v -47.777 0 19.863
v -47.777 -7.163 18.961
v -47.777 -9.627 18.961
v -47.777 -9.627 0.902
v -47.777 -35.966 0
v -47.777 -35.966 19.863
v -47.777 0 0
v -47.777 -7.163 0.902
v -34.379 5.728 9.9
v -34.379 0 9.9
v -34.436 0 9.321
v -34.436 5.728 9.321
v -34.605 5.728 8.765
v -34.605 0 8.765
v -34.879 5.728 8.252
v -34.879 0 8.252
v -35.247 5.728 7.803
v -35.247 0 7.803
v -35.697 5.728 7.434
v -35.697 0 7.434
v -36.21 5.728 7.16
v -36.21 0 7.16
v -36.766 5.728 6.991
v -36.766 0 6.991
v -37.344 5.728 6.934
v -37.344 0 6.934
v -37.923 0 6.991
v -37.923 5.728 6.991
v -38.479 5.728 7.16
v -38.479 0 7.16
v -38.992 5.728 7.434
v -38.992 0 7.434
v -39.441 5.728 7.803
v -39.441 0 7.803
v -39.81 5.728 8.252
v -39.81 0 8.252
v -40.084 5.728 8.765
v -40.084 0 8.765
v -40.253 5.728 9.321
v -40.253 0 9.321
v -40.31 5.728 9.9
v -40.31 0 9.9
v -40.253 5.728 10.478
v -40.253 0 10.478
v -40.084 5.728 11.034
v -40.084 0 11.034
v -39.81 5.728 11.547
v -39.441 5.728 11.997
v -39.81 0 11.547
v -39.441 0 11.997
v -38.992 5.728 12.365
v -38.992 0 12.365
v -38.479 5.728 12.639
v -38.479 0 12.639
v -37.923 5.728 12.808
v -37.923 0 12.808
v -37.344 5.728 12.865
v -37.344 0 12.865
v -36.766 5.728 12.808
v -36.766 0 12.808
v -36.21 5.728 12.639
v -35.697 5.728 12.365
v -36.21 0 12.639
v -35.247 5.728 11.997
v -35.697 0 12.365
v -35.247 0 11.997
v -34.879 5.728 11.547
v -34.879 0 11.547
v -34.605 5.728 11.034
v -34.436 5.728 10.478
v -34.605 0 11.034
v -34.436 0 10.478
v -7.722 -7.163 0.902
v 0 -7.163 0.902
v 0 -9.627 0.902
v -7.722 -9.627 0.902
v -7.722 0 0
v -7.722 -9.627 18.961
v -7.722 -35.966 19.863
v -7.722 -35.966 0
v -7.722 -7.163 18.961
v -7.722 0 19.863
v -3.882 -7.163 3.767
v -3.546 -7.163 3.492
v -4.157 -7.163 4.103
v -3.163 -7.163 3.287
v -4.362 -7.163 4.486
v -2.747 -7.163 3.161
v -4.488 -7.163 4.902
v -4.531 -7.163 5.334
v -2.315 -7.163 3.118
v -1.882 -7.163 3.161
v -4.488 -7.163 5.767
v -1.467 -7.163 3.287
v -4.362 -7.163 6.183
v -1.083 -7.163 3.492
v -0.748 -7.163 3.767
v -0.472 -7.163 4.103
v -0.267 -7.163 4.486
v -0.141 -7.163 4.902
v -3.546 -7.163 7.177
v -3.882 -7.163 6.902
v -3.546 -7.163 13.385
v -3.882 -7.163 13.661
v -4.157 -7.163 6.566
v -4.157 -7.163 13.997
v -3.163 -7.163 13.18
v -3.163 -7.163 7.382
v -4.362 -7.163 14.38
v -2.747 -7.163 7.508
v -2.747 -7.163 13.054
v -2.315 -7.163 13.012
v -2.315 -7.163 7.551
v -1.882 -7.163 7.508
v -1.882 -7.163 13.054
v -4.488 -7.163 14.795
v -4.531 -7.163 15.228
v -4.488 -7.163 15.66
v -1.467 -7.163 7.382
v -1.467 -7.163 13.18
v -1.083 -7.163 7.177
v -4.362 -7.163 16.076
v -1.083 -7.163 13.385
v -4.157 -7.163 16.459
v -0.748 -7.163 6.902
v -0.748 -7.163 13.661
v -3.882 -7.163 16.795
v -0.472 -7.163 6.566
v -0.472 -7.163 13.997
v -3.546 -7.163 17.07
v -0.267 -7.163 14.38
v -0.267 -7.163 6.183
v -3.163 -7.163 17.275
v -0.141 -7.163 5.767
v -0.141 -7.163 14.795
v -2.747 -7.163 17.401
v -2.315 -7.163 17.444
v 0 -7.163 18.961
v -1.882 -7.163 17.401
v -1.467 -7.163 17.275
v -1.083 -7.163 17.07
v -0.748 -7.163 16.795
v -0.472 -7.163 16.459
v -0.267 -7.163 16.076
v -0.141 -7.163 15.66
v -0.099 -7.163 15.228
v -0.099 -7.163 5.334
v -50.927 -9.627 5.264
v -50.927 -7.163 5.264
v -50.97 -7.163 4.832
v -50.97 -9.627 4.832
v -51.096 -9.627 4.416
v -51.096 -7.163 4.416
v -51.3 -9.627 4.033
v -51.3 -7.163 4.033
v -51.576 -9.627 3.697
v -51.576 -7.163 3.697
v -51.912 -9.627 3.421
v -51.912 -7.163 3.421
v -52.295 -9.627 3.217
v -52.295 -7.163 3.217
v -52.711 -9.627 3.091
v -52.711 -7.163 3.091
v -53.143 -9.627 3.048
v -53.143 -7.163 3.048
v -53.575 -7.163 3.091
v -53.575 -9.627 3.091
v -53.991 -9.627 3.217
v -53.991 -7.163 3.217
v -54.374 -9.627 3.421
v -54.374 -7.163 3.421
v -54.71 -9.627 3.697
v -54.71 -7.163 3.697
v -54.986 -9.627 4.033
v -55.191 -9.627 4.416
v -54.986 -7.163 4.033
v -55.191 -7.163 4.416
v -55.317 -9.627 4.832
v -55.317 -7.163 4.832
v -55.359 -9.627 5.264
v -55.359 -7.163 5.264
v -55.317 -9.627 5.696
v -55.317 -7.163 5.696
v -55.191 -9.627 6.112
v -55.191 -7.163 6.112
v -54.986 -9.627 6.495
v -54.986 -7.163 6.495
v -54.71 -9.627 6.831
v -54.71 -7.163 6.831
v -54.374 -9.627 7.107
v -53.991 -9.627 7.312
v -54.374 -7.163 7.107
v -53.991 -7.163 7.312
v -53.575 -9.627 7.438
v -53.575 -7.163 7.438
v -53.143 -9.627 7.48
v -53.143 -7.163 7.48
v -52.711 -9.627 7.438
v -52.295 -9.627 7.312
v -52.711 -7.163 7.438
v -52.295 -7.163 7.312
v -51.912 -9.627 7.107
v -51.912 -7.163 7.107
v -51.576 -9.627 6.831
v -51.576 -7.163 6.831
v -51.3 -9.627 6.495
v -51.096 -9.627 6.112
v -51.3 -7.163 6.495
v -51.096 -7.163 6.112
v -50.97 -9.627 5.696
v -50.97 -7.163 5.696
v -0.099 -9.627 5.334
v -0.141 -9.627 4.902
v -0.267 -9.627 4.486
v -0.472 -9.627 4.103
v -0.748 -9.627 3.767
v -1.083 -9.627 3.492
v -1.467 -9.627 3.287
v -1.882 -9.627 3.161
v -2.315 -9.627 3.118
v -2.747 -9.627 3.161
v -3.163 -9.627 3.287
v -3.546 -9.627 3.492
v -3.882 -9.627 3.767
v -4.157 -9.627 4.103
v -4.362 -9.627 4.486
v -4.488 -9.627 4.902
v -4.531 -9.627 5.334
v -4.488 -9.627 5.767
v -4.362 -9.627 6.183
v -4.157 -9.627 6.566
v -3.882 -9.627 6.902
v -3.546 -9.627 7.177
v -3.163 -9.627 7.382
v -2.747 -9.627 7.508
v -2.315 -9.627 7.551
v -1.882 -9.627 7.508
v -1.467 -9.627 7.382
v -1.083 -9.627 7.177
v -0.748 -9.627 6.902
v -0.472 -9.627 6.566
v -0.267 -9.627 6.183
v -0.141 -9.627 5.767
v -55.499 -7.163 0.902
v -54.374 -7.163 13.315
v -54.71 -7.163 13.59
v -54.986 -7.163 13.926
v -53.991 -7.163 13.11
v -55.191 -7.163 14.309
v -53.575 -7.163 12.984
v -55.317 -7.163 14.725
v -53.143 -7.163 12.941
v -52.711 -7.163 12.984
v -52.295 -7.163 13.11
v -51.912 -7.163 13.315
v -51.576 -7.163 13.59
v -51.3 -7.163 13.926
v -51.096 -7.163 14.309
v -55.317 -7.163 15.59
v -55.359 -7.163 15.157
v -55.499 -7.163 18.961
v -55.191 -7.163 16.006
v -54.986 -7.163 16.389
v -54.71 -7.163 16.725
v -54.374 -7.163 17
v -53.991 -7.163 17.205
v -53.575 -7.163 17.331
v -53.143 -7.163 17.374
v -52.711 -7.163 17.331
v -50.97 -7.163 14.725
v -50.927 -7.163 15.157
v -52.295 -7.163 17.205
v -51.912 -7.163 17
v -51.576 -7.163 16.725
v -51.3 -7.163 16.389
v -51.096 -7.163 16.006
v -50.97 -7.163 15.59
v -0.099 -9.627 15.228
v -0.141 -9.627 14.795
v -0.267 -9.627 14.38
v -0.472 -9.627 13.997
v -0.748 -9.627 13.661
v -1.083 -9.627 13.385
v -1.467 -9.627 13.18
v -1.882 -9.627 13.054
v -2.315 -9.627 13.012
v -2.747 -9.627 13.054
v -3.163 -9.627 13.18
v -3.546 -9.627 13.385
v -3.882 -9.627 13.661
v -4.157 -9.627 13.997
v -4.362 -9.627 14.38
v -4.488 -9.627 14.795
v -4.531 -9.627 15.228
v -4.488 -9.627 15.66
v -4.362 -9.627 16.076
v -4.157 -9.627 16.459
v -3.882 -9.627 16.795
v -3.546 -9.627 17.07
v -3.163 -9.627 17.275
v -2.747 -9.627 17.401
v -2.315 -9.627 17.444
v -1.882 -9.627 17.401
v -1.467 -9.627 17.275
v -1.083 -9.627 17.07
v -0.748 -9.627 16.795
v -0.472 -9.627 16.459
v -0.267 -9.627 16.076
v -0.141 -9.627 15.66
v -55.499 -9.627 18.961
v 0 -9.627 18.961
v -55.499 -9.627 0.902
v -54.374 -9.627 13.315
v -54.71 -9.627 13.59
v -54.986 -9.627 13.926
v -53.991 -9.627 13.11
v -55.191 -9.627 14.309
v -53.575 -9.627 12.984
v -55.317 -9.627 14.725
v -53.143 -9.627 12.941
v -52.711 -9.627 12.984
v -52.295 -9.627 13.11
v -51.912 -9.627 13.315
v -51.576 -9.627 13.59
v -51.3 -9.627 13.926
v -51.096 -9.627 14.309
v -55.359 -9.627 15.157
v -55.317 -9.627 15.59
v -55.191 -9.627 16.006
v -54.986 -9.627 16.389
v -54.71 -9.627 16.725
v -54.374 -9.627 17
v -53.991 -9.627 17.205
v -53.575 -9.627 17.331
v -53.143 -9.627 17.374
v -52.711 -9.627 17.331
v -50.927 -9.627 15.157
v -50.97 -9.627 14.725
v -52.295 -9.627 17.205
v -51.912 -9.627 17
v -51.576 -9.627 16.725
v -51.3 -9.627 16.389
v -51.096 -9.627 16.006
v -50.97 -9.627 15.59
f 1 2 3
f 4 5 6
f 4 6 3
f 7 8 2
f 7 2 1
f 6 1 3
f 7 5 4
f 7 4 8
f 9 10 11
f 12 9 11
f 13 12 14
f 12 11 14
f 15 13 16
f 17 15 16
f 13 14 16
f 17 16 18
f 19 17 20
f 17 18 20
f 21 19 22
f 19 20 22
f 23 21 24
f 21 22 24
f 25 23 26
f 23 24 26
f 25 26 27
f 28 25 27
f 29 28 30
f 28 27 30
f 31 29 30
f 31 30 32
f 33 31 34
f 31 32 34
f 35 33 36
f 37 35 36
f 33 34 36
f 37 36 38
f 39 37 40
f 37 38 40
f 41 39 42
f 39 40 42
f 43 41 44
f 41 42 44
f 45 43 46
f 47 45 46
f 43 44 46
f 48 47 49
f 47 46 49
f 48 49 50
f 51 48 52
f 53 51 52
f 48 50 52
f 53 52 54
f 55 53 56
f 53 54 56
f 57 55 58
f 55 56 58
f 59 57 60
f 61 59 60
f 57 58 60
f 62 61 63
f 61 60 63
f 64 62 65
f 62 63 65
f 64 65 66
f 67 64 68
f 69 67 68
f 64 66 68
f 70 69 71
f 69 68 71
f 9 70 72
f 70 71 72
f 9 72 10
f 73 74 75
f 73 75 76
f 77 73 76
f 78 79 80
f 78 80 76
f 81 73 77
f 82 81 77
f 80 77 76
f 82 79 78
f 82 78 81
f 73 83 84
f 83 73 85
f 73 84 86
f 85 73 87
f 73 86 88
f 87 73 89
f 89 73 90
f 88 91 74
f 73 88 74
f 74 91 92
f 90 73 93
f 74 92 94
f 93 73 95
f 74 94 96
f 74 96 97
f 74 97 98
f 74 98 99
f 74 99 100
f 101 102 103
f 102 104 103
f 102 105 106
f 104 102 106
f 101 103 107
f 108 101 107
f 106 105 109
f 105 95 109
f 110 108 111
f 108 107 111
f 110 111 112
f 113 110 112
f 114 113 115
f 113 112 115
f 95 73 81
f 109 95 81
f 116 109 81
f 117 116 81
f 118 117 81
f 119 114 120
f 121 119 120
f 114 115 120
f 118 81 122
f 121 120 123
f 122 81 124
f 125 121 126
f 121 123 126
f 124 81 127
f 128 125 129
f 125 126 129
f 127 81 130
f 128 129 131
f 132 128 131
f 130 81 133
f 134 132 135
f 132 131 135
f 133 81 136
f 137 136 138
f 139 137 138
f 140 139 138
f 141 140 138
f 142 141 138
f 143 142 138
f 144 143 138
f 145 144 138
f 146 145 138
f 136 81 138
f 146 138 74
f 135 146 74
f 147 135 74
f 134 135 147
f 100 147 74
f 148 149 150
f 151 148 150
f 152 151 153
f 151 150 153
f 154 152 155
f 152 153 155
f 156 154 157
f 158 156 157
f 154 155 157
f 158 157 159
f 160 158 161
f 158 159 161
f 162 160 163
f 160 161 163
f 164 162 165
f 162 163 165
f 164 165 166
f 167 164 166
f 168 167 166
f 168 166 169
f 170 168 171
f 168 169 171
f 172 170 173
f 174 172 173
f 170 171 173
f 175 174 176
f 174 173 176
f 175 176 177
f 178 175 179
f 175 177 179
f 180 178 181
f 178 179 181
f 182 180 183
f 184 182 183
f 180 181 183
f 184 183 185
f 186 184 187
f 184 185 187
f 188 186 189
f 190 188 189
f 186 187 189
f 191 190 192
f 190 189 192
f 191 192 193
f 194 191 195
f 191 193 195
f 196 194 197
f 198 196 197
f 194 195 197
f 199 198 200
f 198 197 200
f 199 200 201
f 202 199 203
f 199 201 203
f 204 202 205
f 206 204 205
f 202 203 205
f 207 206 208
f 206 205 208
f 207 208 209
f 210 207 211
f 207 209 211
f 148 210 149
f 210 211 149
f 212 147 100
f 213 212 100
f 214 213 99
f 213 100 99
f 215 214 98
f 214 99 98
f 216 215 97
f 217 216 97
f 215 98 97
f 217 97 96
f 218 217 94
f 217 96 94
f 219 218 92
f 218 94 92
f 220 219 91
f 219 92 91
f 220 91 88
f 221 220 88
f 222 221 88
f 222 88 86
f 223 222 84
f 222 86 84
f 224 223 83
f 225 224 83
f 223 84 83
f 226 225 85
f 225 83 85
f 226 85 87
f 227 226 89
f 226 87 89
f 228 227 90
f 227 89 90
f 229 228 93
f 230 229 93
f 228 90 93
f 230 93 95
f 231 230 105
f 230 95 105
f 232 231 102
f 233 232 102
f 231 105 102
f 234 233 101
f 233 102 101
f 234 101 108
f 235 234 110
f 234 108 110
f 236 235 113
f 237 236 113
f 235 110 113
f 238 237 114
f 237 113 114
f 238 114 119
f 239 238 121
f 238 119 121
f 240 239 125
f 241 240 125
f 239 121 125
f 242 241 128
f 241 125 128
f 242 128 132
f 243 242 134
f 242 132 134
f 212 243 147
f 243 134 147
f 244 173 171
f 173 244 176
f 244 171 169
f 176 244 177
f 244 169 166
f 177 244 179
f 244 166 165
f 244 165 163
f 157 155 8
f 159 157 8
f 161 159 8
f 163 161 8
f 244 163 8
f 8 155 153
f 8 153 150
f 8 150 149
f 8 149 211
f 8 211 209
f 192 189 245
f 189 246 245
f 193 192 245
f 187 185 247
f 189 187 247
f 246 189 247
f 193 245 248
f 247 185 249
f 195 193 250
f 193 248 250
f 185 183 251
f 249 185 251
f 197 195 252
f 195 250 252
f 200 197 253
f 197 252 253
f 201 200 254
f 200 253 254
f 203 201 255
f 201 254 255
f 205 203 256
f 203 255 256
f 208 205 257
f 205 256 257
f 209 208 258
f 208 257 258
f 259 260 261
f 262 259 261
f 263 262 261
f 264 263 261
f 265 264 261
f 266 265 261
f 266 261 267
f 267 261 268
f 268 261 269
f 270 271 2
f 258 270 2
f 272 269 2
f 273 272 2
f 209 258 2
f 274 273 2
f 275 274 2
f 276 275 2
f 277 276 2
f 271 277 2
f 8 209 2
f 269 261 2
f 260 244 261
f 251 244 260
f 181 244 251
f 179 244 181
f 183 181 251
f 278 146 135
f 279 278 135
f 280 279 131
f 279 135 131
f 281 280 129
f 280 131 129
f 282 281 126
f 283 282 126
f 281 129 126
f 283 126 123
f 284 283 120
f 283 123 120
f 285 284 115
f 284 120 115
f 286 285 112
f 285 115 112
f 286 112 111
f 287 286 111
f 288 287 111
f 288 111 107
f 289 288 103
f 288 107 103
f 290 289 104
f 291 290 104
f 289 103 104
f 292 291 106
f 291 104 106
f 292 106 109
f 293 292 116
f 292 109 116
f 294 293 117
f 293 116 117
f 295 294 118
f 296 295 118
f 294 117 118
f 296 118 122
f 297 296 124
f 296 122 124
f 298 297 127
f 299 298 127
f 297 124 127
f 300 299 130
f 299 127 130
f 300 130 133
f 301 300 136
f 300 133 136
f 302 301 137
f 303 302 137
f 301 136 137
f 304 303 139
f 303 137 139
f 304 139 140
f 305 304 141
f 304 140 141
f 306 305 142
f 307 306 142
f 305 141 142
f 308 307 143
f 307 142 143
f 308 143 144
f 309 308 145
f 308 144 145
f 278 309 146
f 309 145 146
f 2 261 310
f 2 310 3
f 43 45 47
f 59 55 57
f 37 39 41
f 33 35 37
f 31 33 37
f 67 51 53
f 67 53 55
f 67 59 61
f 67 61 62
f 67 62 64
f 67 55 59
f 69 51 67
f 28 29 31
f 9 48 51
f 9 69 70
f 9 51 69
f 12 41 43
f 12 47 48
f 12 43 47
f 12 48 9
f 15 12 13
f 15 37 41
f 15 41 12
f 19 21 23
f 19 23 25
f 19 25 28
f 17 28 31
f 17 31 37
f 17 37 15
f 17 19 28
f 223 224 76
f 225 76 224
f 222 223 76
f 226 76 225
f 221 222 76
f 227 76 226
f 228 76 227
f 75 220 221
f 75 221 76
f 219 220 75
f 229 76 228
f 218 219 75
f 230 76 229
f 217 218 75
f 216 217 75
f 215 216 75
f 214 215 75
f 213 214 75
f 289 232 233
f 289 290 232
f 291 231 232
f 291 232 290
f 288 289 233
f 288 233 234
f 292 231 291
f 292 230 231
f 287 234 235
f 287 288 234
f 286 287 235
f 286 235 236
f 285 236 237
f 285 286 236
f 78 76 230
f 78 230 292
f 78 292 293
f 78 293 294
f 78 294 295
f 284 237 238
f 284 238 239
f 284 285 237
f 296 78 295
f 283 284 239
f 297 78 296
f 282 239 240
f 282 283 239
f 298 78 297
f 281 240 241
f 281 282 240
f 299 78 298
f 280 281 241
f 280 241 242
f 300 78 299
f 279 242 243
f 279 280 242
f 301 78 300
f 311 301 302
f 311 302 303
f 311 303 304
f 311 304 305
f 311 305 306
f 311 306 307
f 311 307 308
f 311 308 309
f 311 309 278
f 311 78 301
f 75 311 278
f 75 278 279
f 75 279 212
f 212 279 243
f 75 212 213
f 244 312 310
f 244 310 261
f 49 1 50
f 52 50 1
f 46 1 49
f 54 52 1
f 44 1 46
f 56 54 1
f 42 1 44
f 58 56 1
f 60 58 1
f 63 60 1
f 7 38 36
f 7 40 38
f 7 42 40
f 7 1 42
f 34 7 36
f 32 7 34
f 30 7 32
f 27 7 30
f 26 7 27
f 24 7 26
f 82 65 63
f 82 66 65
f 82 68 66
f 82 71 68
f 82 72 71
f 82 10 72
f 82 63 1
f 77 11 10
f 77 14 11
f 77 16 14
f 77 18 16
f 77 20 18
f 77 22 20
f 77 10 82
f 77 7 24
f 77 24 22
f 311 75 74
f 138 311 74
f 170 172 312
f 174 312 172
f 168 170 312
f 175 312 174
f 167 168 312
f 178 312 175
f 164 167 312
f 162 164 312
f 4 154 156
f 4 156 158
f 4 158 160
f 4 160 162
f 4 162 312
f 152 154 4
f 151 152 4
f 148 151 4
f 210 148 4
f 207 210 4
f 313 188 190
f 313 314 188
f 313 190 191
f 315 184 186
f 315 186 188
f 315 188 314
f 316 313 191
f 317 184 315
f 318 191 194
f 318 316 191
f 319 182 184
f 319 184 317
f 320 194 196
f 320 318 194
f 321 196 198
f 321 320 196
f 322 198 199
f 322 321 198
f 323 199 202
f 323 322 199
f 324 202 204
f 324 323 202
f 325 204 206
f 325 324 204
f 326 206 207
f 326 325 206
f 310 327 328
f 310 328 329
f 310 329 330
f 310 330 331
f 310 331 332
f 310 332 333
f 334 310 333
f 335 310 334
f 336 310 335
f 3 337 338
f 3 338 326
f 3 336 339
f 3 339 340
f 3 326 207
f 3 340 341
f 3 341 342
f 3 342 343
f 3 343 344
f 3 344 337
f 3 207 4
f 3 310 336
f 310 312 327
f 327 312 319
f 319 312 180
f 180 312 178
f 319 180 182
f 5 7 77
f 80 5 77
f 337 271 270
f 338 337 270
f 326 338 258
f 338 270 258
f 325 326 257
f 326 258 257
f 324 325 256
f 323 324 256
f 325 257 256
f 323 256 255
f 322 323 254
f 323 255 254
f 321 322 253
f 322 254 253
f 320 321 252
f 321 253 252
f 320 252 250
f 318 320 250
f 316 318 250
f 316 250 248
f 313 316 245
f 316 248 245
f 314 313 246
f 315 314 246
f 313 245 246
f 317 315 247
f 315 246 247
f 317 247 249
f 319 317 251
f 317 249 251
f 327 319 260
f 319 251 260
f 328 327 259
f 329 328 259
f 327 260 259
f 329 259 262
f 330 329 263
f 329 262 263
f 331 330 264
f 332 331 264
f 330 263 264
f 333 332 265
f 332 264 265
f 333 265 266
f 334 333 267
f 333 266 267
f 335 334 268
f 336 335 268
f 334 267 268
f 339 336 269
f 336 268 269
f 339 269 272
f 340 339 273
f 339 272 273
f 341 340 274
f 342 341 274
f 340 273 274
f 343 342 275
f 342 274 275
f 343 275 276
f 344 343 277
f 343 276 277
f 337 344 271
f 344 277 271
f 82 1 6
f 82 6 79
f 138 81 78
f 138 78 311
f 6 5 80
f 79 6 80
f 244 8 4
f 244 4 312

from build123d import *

# Parameters (mm, degrees)
SKETCH1_W           = 55.499
SKETCH1_H           = 35.9664
BOSS_EXTRUDE1_DEPTH = 19.8628
SKETCH2_W           = 7.7216
SKETCH2_H           = 7.1628
SKETCH2_H_2         = 26.3398
CUT_EXTRUDE1_DEPTH  = 19.8628
SKETCH3_W           = 7.7216
SKETCH3_H           = 7.1628
SKETCH3_H_2         = 26.3398
CUT_EXTRUDE2_DEPTH  = 19.8628
SKETCH4_R           = 2.21615
CUT_EXTRUDE3_DEPTH  = 2.4638
SKETCH5_W           = 7.7216
SKETCH5_H           = 2.4638
CUT_EXTRUDE4_DEPTH  = 0.9017
SKETCH6_W           = 7.7216
SKETCH6_H           = 2.4638
CUT_EXTRUDE5_DEPTH  = 0.9017
SKETCH7_W           = 7.7216
SKETCH7_H           = 2.4638
CUT_EXTRUDE6_DEPTH  = 0.9017
SKETCH8_W           = 7.7216
SKETCH8_H           = 2.4638
CUT_EXTRUDE7_DEPTH  = 0.9017
SKETCH9_R           = 2.96545
BOSS_EXTRUDE2_DEPTH = 5.7277


with BuildPart() as part:
    # Sketch1 → Boss-Extrude1 (new body)
    with BuildSketch(Plane.XY):
        with Locations((-27.7495, -17.9832)):
            Rectangle(SKETCH1_W, SKETCH1_H)
    extrude(amount=BOSS_EXTRUDE1_DEPTH)

    # Sketch2 → Cut-Extrude1 (cut)
    with BuildSketch(Plane.XY.offset(19.8628)):
        with Locations((-51.6382, -3.5814)):
            Rectangle(SKETCH2_W, SKETCH2_H)
        with Locations((-51.6382, -22.7965)):
            Rectangle(SKETCH2_W, SKETCH2_H_2)
    extrude(amount=-CUT_EXTRUDE1_DEPTH, mode=Mode.SUBTRACT)

    # Sketch3 → Cut-Extrude2 (cut)
    with BuildSketch(Plane.XY.offset(19.8628)):
        with Locations((-3.8608, -3.5814)):
            Rectangle(SKETCH3_W, SKETCH3_H)
        with Locations((-3.8608, -22.7965)):
            Rectangle(SKETCH3_W, SKETCH3_H_2)
    extrude(amount=-CUT_EXTRUDE2_DEPTH, mode=Mode.SUBTRACT)

    # Sketch4 → Cut-Extrude3 (cut)
    with BuildSketch(Plane(origin=(0, -7.1628, 0), x_dir=(1, 0, 0), z_dir=(0, 1, 0))):
        with Locations((-53.14315, -5.26415)):
            Circle(SKETCH4_R)
        with Locations((-53.14315, -15.15745)):
            Circle(SKETCH4_R)
        with Locations((-2.314703143, -5.334451514)):
            Circle(SKETCH4_R)
        with Locations((-2.314703143, -15.227751514)):
            Circle(SKETCH4_R)
    extrude(amount=-CUT_EXTRUDE3_DEPTH, mode=Mode.SUBTRACT)

    # Sketch5 → Cut-Extrude4 (cut)
    with BuildSketch(Plane.XY.offset(19.8628)):
        with Locations((-51.6382, -8.3947)):
            Rectangle(SKETCH5_W, SKETCH5_H)
    extrude(amount=-CUT_EXTRUDE4_DEPTH, mode=Mode.SUBTRACT)

    # Sketch6 → Cut-Extrude5 (cut)
    with BuildSketch(Plane(origin=(0, 0, 0), x_dir=(-1, 0, 0), z_dir=(0, 0, -1))):
        with Locations((51.6382, -8.3947)):
            Rectangle(SKETCH6_W, SKETCH6_H)
    extrude(amount=-CUT_EXTRUDE5_DEPTH, mode=Mode.SUBTRACT)

    # Sketch7 → Cut-Extrude6 (cut)
    with BuildSketch(Plane(origin=(0, 0, 0), x_dir=(-1, 0, 0), z_dir=(0, 0, -1))):
        with Locations((3.8608, -8.3947)):
            Rectangle(SKETCH7_W, SKETCH7_H)
    extrude(amount=-CUT_EXTRUDE6_DEPTH, mode=Mode.SUBTRACT)

    # Sketch8 → Cut-Extrude7 (cut)
    with BuildSketch(Plane.XY.offset(19.8628)):
        with Locations((-3.8608, -8.3947)):
            Rectangle(SKETCH8_W, SKETCH8_H)
    extrude(amount=-CUT_EXTRUDE7_DEPTH, mode=Mode.SUBTRACT)

    # Sketch9 → Boss-Extrude2 (add)
    with BuildSketch(Plane(origin=(0, 0, 0), x_dir=(1, 0, 0), z_dir=(0, 1, 0))):
        with Locations((-37.34435, -9.89965)):
            Circle(SKETCH9_R)
    extrude(amount=BOSS_EXTRUDE2_DEPTH)


solid = part.part
